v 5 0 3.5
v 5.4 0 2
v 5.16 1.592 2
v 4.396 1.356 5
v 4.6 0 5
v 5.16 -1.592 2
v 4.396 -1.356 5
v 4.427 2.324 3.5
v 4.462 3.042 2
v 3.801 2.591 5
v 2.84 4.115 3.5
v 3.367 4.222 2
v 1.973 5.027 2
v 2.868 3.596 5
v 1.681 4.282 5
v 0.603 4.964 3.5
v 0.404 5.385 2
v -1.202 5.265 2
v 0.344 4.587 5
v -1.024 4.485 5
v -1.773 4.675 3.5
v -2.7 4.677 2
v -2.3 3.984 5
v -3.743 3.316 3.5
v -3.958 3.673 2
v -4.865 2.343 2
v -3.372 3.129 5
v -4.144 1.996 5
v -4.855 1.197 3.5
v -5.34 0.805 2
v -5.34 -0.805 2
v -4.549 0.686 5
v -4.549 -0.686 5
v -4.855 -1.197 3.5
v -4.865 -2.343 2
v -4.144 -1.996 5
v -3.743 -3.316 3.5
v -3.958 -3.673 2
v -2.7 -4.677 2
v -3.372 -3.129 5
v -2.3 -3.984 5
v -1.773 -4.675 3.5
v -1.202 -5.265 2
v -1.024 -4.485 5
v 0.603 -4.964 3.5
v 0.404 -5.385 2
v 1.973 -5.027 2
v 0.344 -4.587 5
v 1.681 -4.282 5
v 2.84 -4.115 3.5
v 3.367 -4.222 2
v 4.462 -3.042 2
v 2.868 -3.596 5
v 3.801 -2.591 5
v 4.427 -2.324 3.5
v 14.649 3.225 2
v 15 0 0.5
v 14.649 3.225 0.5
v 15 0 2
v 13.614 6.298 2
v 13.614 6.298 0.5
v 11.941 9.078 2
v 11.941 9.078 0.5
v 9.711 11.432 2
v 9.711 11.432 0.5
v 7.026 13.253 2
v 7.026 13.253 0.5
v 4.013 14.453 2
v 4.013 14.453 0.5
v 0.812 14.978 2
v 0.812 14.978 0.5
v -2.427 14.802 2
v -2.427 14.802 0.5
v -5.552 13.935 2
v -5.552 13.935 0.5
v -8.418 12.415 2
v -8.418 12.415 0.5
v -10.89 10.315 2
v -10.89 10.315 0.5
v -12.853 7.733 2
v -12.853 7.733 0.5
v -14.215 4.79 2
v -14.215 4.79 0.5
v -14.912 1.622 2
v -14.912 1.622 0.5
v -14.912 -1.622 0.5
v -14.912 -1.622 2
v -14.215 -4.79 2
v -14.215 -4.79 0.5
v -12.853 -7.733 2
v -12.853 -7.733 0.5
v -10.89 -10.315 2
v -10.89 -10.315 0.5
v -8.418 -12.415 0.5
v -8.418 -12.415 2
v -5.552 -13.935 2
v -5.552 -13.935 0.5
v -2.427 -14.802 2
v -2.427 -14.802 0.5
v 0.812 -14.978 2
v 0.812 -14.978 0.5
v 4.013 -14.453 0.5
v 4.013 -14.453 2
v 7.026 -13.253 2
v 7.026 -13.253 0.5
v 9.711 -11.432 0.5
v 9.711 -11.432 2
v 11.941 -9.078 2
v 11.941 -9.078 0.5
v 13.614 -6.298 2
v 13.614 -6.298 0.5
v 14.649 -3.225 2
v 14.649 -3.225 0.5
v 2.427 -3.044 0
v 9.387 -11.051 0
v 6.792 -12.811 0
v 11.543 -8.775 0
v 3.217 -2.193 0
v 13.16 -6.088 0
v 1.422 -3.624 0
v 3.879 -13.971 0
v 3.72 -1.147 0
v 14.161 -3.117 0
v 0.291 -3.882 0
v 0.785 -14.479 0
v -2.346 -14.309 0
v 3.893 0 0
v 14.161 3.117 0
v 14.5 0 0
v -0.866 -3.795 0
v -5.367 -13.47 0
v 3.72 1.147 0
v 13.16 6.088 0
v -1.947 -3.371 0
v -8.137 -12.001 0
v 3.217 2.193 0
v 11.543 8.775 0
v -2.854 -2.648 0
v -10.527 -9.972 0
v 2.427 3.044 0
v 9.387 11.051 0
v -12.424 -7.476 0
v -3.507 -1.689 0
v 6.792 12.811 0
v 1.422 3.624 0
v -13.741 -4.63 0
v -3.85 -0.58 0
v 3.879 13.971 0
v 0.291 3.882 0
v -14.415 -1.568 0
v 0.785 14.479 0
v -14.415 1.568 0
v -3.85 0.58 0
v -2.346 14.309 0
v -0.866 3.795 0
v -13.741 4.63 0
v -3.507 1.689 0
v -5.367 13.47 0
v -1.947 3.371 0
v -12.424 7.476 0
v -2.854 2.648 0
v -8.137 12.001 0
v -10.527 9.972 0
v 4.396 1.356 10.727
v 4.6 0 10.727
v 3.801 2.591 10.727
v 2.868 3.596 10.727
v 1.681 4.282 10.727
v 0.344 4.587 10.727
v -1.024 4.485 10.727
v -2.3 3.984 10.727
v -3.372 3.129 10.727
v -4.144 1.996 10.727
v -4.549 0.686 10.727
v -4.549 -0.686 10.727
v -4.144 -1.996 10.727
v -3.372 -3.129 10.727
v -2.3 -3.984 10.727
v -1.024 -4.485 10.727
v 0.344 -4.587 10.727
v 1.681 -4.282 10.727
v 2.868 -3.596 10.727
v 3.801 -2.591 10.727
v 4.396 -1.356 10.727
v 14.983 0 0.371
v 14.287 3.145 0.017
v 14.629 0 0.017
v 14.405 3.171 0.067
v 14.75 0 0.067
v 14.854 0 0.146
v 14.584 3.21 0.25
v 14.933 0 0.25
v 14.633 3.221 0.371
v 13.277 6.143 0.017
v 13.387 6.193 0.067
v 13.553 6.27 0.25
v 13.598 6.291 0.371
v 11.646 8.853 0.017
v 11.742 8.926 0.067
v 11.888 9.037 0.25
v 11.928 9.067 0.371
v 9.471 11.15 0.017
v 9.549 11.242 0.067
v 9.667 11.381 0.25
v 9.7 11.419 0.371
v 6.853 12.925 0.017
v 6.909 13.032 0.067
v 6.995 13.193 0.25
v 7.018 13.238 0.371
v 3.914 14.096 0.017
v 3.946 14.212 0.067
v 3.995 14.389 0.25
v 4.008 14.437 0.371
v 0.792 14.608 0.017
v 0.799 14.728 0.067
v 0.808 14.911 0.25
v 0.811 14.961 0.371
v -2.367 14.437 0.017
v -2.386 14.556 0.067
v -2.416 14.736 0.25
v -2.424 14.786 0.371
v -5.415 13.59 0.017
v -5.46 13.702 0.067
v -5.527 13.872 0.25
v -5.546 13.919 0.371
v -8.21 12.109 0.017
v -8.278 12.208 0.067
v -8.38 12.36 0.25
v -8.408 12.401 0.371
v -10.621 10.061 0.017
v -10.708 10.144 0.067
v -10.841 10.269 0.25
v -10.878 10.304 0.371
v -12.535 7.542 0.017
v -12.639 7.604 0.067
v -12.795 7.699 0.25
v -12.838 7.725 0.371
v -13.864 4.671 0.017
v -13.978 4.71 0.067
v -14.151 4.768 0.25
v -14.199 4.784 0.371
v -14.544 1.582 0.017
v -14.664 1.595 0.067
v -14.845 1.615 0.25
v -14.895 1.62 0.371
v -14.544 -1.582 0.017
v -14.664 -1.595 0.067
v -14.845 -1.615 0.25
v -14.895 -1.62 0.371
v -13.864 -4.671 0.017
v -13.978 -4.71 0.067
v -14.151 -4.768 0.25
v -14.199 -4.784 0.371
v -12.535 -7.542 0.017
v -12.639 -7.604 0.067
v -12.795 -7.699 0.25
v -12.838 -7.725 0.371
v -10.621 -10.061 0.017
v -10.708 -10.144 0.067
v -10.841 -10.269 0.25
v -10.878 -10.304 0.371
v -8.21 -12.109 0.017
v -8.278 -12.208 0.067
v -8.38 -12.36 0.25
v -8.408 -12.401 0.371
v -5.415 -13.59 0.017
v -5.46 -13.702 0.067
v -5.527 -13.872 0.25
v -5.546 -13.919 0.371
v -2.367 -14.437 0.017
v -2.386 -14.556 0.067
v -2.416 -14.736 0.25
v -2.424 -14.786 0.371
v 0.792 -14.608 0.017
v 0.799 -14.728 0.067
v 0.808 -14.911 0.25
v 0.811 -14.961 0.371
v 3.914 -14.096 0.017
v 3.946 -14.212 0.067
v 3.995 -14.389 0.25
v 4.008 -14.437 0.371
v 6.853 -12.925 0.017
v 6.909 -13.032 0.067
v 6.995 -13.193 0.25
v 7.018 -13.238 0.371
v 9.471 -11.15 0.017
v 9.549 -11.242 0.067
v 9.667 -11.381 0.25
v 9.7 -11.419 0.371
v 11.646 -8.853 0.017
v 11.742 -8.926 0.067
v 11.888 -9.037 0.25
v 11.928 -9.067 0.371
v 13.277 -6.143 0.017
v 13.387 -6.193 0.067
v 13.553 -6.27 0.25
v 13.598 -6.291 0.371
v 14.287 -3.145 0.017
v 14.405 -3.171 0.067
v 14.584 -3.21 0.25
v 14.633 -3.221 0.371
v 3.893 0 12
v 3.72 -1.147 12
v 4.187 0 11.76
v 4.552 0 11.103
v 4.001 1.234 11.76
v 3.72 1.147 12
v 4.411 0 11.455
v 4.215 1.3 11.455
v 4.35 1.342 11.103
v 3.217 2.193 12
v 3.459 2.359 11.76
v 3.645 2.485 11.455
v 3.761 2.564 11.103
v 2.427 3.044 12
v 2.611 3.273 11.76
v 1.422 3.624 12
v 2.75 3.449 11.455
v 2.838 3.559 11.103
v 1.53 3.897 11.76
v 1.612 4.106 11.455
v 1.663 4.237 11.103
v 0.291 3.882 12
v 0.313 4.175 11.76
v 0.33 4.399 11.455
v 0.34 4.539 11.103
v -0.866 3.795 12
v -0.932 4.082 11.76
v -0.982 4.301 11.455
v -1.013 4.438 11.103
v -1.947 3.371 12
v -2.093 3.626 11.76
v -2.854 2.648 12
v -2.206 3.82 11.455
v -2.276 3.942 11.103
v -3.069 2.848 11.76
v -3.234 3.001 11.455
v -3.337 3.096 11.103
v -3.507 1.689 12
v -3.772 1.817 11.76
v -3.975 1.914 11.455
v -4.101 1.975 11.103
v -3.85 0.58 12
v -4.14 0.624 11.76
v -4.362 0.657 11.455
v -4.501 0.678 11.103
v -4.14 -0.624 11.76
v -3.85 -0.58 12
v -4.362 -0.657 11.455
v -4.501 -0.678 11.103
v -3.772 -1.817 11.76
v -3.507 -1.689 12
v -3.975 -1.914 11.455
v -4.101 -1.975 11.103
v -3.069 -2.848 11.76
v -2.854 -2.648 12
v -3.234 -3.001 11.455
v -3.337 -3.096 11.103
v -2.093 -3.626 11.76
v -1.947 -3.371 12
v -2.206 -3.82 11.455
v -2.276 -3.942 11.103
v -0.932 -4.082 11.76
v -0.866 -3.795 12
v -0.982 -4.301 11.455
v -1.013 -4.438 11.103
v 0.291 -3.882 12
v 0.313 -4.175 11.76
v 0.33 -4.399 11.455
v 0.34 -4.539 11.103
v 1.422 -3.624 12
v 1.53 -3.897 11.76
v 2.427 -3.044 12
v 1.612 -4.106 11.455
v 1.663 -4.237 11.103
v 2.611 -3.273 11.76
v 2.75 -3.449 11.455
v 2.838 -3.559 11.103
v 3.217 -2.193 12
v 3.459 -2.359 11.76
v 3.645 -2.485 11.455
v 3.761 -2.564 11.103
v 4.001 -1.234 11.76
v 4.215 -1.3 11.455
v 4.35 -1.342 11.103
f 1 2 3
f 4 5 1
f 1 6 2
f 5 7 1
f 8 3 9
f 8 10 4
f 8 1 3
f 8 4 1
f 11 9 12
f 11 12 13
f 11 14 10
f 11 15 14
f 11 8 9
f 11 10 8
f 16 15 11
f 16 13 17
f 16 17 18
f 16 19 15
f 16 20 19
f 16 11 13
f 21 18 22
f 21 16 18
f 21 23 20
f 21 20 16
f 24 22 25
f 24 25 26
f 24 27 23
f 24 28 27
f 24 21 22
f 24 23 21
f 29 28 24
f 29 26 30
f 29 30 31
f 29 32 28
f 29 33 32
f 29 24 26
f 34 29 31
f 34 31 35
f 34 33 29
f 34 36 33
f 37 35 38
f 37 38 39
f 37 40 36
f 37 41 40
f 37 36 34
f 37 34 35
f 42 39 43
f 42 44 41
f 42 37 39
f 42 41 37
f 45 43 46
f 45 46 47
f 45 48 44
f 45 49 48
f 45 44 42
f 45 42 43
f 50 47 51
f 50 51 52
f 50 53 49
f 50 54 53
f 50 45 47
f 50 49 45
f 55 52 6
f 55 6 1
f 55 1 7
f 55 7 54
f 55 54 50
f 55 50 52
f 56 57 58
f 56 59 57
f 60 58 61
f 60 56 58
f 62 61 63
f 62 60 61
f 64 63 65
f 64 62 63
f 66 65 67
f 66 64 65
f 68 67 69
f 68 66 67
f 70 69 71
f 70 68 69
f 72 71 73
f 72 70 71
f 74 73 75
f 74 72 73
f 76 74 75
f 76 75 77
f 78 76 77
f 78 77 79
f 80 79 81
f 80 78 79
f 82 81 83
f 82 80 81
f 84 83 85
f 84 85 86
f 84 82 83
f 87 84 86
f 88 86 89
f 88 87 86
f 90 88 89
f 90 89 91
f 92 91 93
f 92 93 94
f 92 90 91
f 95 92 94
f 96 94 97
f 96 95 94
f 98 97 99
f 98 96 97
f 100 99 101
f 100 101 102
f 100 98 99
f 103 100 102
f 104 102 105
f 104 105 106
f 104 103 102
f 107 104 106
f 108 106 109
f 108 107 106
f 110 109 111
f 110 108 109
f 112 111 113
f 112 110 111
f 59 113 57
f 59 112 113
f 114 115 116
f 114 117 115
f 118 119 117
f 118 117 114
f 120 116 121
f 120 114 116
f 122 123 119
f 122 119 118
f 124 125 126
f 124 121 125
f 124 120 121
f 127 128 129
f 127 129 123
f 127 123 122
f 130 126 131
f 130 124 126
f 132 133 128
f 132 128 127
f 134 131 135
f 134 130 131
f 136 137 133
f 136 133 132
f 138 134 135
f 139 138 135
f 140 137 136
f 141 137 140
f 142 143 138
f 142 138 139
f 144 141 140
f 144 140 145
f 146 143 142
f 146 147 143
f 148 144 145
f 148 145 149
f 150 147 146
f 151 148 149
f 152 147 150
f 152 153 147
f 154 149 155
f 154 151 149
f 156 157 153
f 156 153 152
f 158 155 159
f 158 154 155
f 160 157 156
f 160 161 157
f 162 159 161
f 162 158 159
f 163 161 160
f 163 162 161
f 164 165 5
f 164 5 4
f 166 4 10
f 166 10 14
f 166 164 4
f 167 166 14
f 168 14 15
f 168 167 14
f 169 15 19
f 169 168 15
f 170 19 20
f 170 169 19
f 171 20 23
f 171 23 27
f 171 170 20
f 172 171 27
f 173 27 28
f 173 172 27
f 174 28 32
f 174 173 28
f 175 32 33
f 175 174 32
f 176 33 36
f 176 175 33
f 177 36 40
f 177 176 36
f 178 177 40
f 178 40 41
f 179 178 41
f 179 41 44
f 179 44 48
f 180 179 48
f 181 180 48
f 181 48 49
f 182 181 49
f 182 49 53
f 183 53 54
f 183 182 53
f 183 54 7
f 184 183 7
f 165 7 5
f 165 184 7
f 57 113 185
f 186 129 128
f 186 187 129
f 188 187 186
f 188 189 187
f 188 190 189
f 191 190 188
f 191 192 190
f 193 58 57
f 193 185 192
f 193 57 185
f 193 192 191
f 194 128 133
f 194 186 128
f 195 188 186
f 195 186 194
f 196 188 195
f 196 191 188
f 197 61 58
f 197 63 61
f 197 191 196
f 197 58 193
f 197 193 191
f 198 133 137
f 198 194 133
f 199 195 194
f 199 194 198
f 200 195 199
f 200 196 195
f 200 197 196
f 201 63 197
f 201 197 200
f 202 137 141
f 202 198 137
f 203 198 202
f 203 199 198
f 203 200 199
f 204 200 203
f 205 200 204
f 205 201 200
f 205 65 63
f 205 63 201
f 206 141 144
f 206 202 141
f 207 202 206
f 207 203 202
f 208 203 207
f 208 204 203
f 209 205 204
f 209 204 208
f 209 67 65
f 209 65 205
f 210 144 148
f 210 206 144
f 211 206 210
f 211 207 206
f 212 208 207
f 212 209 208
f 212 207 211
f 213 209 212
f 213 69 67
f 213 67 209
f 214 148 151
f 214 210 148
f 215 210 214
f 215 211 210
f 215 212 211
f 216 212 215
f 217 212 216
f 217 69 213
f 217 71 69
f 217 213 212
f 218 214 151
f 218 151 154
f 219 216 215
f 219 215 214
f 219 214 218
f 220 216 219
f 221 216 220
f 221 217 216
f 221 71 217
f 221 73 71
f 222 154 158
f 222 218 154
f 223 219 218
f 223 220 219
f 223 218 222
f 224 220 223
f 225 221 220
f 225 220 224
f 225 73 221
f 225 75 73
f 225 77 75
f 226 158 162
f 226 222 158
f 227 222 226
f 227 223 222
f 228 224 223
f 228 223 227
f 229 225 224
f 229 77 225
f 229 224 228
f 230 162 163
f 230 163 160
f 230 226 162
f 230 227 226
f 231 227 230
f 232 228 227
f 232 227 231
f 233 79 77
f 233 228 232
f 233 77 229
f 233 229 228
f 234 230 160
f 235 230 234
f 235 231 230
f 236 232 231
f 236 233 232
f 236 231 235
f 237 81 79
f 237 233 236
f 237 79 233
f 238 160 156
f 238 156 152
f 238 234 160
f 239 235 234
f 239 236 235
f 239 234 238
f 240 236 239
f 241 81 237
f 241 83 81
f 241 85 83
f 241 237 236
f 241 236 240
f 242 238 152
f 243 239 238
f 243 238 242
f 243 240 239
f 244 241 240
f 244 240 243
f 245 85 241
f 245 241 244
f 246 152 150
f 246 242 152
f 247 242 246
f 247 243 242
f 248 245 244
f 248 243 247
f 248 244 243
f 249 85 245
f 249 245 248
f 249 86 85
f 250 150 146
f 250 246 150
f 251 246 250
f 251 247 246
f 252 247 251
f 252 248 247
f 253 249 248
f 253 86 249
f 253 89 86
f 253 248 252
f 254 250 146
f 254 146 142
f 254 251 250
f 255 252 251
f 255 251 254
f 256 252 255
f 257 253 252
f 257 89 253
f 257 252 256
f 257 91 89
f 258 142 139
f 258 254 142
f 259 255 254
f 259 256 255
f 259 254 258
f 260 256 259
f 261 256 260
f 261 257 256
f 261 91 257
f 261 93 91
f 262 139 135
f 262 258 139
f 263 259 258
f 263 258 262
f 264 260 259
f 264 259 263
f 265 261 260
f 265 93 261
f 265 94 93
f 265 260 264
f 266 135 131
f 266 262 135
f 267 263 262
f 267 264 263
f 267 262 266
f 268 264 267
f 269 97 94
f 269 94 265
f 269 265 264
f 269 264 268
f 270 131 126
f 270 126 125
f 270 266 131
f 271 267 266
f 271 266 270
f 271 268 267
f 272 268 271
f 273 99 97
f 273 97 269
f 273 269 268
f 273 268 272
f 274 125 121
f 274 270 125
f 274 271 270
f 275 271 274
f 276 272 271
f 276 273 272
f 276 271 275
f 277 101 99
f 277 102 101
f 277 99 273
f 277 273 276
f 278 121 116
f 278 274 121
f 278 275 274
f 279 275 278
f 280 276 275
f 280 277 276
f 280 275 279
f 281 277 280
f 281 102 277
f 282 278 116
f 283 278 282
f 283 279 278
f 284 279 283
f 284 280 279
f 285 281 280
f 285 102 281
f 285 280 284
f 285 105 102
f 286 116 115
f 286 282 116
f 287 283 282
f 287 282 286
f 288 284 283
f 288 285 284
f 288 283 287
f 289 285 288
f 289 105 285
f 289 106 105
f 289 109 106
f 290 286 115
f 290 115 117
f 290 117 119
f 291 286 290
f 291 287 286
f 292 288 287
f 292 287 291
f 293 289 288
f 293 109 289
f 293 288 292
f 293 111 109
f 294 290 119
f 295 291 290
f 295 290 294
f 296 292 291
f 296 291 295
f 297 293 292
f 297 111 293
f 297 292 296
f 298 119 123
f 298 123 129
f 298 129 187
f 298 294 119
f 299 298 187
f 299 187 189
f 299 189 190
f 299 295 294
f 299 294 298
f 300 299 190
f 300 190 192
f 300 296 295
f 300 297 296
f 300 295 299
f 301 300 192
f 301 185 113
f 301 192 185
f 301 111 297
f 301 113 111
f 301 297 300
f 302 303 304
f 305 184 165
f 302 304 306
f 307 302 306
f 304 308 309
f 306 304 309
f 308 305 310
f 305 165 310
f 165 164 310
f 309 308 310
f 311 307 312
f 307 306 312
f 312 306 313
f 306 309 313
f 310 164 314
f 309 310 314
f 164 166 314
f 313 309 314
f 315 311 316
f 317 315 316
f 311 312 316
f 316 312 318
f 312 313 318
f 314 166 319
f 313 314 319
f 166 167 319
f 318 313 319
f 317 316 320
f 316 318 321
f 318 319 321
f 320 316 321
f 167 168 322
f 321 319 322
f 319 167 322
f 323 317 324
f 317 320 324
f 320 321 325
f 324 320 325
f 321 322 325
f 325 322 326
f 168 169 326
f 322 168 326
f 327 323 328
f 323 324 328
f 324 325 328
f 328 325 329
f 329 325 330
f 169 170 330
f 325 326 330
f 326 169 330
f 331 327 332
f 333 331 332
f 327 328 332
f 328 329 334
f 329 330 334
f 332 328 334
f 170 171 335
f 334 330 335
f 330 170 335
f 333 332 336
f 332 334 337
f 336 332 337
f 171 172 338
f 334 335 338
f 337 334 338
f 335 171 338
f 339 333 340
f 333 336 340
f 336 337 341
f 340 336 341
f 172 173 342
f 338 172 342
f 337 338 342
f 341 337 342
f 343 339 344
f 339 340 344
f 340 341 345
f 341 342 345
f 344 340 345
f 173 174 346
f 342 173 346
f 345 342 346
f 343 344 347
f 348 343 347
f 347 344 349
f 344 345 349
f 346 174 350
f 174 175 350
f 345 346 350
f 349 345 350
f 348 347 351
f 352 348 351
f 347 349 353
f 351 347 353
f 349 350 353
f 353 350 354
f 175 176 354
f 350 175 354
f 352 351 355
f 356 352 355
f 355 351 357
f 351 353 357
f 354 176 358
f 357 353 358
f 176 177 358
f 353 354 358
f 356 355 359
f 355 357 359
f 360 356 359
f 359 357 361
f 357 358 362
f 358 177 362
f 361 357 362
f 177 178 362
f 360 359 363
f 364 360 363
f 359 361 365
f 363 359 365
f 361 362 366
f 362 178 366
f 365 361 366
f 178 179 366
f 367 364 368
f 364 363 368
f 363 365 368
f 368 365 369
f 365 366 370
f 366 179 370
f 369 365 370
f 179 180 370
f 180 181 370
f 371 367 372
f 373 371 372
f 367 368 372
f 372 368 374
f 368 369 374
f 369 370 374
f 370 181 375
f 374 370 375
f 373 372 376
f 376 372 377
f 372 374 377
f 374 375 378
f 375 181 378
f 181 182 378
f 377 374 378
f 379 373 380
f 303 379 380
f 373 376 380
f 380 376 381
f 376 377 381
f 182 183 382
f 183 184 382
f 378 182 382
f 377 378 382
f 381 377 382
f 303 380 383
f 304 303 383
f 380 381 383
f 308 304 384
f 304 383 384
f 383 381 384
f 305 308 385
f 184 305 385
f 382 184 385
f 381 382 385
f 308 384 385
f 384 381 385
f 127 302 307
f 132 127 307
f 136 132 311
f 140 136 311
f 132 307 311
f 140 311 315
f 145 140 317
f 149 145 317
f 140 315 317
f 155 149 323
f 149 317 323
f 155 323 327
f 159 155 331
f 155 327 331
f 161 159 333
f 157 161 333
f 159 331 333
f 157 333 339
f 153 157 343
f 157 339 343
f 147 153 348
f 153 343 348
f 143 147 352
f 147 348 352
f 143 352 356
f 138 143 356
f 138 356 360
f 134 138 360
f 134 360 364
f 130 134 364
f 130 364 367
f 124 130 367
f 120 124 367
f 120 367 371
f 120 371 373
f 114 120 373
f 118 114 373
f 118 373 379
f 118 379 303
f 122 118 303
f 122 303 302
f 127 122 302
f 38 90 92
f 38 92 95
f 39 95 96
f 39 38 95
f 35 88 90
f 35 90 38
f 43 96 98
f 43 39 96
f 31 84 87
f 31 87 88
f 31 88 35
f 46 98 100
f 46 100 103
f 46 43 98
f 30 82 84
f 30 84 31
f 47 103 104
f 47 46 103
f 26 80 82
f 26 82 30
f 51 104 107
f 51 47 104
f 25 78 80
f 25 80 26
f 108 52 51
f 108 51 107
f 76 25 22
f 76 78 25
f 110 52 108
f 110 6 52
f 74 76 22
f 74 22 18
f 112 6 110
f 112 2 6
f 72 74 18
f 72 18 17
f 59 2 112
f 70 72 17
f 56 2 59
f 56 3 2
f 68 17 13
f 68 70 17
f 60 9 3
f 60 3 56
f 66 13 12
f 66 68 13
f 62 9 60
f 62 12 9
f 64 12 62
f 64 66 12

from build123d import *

# Parameters (mm, degrees)
F3_R     = 3.8930000325
F4_DEPTH = 12.001


# Not quite as in the source:
# - a fillet or chamfer that OpenCascade refuses, or shapes differently, is made with other operations: its cross-section is extruded or revolved along the edge and cut away or added


with BuildPart() as f1:
    # F0 (on Front) → F1 (revolve)
    with BuildSketch(Plane.XZ):
        with BuildLine():
            Line((0, 12), (0, 0))
            Line((0, 0), (14.5, 0))
            ThreePointArc((14.5, 0), (14.8535533906, 0.1464466094), (15, 0.5))
            Line((15, 0.5), (15, 2))
            Line((15, 2), (5.4, 2))
            Line((5.4, 2), (4.6, 5))
            Line((4.6, 5), (4.6, 12))
            Line((4.6, 12), (0, 12))
        make_face()
    revolve(axis=Axis((0, 0, 6), (0, 0, 1)))

    # F3 (on face) → F4 (cut, through all)
    with BuildSketch(Plane.XY.offset(12)):
        Circle(F3_R)
    extrude(amount=-F4_DEPTH, mode=Mode.SUBTRACT)

    # F5: fillet of radius 1.5 on 1 edges, made by hand

    # F5_s1 → F5_t2 (revolve, cut)
    with BuildSketch(Plane.XZ):
        with BuildLine():
            ThreePointArc((3.8930000325, 12), (4.4113923991, 11.4549383915), (4.6, 10.7267557389))
            Line((4.6, 10.7267557389), (4.6, 12))
            Line((4.6, 12), (3.8930000325, 12))
        make_face()
    revolve(axis=Axis((0, 0, 12), (0, 0, 1)), mode=Mode.SUBTRACT)


solid = f1.part
